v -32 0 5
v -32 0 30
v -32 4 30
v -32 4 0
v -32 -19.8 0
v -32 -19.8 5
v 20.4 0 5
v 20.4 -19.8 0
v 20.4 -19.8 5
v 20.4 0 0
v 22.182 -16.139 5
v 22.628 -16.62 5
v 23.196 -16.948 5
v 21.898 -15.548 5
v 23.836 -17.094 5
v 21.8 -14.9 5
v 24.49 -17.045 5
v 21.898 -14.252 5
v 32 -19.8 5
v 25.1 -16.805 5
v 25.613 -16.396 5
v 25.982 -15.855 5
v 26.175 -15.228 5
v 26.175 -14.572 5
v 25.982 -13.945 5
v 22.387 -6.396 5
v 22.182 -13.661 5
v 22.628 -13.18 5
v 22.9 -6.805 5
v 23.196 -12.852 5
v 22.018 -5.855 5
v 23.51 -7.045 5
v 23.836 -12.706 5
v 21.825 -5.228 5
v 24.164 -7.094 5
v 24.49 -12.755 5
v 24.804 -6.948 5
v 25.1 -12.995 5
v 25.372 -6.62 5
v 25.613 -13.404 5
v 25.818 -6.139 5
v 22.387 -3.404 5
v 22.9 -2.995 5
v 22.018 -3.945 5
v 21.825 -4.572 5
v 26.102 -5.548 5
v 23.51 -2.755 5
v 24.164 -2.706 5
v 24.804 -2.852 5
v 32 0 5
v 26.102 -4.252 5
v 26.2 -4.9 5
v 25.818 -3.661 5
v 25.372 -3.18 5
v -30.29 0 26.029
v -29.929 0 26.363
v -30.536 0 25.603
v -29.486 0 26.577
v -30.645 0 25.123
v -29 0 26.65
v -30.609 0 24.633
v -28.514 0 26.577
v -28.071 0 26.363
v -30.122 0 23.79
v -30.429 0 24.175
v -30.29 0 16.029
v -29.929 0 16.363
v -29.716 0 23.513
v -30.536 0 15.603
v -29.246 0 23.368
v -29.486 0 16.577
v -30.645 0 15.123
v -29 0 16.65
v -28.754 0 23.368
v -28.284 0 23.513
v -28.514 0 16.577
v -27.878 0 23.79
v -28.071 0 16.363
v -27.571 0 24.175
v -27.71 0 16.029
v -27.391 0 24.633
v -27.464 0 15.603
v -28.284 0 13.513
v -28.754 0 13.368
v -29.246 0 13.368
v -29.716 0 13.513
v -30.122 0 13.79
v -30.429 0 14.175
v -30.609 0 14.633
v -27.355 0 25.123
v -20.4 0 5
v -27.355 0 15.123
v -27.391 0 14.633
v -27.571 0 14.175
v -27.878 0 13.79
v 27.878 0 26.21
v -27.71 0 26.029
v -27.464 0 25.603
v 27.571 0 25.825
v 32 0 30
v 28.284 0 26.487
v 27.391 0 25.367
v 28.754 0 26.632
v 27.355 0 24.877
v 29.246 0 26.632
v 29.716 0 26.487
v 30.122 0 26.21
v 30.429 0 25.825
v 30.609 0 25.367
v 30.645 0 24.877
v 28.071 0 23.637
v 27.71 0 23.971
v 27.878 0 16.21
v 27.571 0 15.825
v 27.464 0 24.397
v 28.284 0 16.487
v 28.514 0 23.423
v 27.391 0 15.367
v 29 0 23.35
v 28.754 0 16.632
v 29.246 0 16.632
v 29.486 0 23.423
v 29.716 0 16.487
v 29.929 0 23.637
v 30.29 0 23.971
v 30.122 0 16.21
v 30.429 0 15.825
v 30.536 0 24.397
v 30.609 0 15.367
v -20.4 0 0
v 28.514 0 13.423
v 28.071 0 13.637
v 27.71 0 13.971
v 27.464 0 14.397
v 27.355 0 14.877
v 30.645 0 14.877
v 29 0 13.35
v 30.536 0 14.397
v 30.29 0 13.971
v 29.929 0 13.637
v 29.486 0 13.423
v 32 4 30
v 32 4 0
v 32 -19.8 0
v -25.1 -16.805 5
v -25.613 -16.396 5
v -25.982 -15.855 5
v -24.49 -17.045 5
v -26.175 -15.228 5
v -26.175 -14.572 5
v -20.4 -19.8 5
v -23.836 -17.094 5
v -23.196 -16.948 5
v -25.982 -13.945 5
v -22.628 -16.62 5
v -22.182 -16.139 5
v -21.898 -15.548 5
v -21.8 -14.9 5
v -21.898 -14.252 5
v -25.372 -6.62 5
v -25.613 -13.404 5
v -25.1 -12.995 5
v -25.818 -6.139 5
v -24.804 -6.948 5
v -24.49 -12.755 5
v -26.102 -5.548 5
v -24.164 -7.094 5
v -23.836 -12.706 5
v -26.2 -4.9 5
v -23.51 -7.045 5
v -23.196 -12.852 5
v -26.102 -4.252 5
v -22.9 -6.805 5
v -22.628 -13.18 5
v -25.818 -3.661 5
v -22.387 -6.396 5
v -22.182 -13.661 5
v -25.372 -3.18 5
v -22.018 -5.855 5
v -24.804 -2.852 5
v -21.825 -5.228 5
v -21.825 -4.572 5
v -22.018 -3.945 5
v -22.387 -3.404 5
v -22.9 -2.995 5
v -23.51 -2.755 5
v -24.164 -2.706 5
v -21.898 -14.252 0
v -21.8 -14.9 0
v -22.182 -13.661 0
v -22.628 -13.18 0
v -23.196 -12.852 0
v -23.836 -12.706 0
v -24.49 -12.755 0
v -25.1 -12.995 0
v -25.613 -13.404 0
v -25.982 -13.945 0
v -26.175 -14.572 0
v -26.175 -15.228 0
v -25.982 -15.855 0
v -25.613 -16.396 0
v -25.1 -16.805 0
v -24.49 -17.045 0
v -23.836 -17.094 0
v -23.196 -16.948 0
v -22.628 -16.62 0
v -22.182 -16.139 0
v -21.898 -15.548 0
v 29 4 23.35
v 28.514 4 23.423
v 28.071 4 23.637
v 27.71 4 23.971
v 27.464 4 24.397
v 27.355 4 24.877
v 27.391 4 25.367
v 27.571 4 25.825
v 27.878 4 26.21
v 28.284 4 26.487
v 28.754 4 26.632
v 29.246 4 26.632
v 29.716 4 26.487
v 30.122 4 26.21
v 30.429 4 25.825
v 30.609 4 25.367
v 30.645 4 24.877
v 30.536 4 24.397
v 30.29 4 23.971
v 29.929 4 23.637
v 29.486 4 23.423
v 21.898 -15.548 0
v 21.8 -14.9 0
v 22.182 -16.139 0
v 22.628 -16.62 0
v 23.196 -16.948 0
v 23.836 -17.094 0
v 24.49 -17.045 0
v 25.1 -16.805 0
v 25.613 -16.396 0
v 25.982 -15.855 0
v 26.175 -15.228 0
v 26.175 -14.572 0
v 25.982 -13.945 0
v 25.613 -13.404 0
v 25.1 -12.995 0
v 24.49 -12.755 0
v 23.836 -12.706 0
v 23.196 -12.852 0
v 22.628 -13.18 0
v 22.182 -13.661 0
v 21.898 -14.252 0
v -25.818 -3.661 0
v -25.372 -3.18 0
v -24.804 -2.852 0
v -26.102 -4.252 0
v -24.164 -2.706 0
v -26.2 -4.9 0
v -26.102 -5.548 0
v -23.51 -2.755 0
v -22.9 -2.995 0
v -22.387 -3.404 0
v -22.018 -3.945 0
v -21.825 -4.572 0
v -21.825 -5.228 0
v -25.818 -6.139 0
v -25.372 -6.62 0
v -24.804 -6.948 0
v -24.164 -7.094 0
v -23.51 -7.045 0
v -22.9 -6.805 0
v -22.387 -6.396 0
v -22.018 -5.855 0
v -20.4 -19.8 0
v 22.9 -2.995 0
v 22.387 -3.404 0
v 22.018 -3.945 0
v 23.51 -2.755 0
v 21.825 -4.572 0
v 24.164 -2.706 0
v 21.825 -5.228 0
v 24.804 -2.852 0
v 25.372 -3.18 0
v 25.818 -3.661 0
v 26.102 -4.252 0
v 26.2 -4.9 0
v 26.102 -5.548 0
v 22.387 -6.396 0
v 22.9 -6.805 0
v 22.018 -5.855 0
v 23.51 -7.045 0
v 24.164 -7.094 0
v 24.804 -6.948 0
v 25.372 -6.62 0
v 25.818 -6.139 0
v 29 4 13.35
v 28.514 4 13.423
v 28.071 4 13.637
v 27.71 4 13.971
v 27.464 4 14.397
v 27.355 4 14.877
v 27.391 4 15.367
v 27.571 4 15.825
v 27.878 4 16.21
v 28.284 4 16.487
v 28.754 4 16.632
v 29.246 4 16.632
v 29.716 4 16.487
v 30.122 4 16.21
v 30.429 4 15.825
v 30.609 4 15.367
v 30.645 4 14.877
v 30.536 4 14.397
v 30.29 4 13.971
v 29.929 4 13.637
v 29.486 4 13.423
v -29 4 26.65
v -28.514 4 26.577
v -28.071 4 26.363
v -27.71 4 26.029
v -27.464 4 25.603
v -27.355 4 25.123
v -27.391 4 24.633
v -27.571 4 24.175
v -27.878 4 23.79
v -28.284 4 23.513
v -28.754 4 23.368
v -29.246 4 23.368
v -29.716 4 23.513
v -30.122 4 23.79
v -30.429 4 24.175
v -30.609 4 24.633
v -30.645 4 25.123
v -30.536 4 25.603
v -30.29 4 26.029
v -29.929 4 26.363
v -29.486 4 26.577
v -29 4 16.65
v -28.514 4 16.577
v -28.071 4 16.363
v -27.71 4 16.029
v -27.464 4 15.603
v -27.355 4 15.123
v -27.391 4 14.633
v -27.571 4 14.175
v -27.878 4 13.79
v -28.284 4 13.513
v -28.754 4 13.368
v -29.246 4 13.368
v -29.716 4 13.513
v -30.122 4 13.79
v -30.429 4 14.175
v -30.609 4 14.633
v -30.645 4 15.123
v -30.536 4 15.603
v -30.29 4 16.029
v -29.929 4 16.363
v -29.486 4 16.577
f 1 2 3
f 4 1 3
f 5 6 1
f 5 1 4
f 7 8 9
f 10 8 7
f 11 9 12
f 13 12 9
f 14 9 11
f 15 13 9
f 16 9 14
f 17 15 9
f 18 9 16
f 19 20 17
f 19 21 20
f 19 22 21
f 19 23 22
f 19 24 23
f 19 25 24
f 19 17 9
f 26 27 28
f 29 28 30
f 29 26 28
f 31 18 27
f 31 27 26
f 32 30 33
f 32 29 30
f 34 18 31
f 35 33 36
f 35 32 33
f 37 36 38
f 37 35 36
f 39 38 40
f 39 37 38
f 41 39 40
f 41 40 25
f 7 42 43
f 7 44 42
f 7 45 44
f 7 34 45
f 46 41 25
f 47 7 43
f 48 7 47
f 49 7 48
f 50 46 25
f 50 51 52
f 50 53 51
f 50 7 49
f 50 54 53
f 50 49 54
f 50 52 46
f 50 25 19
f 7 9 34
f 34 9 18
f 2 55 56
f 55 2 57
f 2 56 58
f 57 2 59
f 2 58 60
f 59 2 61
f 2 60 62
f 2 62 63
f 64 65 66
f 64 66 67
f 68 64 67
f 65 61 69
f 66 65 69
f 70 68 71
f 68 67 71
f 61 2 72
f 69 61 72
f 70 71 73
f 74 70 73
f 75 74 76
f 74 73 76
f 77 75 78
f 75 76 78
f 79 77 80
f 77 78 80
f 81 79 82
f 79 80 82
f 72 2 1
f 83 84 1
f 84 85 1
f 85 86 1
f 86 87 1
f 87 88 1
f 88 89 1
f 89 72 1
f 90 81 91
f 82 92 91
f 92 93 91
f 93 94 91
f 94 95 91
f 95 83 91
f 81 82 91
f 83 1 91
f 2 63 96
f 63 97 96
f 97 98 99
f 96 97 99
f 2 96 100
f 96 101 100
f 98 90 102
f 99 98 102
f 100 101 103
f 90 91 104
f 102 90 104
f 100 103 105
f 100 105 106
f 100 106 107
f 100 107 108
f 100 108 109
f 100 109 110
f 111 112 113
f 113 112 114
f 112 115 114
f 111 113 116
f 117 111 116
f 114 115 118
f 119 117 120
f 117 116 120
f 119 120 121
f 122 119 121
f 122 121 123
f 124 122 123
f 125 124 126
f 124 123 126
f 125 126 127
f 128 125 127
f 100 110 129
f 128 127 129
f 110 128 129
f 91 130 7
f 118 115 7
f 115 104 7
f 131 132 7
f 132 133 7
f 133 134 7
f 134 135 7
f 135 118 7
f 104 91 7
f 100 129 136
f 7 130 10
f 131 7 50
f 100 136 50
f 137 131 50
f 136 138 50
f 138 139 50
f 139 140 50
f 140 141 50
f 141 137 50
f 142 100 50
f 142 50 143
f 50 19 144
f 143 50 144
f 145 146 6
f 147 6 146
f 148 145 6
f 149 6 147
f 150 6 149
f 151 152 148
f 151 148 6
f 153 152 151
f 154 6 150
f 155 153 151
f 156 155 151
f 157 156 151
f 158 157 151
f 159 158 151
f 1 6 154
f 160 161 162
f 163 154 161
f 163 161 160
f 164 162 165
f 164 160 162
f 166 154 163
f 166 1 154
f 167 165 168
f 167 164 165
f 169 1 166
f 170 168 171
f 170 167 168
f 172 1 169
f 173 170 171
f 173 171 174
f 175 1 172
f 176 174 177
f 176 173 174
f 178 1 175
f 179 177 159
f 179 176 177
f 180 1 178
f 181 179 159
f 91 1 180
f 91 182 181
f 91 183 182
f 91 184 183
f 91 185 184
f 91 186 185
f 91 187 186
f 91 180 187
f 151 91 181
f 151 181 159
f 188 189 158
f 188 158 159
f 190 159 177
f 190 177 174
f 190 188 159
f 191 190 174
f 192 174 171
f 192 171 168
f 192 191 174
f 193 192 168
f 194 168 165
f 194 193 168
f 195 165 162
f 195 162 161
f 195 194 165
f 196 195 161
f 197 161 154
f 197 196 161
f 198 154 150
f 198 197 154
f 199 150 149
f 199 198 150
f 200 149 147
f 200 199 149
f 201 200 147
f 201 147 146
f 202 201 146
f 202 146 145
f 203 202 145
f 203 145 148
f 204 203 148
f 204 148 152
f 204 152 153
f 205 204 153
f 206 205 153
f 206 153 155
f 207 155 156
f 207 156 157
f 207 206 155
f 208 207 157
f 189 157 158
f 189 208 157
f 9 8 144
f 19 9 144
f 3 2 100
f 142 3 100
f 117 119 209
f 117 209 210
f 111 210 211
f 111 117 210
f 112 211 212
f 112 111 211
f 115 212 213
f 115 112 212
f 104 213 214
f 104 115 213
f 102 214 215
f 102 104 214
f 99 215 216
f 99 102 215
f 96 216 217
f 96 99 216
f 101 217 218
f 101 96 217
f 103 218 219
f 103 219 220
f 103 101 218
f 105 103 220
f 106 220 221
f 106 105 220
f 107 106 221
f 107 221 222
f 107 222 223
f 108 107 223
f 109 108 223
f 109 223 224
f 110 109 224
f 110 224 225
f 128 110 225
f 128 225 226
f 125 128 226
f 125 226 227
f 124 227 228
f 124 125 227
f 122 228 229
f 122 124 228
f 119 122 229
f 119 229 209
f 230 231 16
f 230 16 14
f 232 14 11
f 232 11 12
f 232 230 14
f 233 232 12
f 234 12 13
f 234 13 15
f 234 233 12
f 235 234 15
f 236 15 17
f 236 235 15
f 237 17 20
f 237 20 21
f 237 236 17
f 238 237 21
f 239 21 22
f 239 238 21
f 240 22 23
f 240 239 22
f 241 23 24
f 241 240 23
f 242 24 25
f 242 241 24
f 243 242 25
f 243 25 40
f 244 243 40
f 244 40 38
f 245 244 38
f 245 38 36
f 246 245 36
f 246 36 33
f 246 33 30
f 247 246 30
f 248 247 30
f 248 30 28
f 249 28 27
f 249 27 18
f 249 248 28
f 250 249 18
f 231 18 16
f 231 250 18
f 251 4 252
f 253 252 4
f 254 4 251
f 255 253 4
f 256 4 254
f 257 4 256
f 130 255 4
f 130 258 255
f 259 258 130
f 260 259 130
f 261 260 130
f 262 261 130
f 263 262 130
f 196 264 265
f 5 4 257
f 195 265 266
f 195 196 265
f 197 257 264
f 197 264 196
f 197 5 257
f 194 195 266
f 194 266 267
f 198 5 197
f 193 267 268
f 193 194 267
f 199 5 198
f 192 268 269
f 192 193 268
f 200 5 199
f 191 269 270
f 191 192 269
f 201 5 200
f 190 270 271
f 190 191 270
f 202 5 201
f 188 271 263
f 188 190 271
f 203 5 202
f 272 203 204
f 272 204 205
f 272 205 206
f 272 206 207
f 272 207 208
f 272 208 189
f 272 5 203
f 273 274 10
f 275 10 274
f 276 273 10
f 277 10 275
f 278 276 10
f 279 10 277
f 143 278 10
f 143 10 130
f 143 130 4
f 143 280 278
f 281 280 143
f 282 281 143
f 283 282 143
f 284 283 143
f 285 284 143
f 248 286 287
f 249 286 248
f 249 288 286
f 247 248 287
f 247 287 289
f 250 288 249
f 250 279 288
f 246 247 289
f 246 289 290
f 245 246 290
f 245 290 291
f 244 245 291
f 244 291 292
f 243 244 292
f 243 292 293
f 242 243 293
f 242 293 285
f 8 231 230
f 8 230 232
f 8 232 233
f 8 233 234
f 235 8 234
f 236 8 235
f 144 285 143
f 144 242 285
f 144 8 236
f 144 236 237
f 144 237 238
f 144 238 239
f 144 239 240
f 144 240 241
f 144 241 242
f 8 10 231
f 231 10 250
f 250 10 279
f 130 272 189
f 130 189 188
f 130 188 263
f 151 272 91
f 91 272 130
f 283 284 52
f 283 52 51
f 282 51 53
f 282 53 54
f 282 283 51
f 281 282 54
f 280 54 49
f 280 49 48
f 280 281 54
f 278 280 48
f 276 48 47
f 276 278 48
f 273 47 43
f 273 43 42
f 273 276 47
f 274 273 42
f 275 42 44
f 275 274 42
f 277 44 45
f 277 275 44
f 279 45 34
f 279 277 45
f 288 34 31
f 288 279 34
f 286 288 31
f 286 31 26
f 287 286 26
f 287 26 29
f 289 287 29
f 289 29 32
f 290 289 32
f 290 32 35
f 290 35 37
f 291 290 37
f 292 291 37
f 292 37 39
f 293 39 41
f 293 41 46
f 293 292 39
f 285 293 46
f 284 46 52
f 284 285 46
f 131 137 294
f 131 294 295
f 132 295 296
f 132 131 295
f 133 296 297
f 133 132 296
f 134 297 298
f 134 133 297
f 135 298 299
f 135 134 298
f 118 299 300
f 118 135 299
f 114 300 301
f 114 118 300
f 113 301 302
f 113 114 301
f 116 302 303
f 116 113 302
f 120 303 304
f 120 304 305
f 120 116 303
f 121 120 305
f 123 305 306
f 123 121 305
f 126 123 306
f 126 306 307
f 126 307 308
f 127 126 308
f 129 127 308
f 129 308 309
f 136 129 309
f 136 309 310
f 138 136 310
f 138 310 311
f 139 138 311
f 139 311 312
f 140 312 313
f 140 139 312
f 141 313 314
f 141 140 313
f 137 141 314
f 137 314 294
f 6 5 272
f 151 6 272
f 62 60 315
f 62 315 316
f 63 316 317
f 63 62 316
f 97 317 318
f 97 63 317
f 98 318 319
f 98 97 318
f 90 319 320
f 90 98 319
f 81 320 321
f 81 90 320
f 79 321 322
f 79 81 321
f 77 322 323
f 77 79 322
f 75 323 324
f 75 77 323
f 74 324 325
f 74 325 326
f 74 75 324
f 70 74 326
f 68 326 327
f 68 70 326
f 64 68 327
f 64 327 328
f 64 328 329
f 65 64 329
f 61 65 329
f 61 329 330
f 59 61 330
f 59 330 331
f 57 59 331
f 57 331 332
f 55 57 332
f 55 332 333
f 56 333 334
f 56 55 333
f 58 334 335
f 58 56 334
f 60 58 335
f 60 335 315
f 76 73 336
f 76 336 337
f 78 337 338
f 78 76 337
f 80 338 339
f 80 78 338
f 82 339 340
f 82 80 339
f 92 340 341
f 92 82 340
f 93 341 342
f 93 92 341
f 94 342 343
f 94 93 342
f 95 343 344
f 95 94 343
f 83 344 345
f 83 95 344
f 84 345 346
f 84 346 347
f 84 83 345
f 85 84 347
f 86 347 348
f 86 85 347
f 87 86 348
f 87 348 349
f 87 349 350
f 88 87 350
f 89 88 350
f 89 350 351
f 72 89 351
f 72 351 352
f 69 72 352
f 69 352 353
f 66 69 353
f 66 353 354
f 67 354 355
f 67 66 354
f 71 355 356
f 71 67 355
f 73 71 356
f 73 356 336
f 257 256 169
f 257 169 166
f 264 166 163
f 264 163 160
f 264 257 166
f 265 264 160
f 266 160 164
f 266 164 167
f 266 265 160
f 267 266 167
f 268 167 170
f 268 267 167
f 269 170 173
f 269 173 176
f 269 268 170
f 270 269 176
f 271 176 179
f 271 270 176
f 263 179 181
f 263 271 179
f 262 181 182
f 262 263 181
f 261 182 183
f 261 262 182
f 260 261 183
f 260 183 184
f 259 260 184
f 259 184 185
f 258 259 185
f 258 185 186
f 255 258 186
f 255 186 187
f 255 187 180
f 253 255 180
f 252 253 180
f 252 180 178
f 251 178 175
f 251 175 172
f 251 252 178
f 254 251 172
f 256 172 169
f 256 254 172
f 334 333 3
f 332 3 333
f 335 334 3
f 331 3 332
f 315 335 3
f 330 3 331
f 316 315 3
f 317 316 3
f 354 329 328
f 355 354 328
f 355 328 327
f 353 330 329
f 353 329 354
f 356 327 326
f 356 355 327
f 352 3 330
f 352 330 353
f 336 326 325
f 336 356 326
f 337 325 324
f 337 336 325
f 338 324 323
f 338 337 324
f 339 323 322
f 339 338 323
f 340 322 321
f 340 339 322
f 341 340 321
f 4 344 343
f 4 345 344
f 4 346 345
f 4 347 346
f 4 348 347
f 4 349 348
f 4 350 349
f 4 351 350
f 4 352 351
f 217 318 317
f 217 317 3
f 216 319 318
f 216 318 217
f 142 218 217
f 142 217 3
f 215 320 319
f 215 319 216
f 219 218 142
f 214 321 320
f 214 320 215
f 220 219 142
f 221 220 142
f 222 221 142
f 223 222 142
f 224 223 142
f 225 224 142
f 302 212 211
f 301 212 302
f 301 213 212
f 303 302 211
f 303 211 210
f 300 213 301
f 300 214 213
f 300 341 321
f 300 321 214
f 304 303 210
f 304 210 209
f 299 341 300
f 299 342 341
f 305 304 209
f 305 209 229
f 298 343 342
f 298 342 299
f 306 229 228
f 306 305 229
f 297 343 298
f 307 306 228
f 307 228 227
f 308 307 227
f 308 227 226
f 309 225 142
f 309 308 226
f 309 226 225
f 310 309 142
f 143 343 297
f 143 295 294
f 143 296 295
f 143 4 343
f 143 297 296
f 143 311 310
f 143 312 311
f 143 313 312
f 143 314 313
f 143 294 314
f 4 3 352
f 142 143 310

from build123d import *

# Parameters (mm, degrees)
SKETCH_1_W        = 11.6
SKETCH_1_H        = 19.8
SKETCH_1_R        = 2.2
EXTRUDE_1_DEPTH   = 5
EXTRUDE_1_2_DEPTH = 5
SKETCH_3_W        = 64
SKETCH_3_H        = 30
SKETCH_3_R        = 1.65
EXTRUDE_2_DEPTH   = 4


with BuildPart() as part:
    # 草图1 → 凸台-拉伸1 (new body)
    with BuildSketch(Plane.XY):
        with Locations((26.2, -9.9)):
            Rectangle(SKETCH_1_W, SKETCH_1_H)
        with Locations((24, -4.9)):
            Circle(SKETCH_1_R, mode=Mode.SUBTRACT)
        with Locations(Location((24, -14.9, 0), (0, 0, 180))):
            Circle(SKETCH_1_R, mode=Mode.SUBTRACT)
    extrude(amount=EXTRUDE_1_DEPTH)



with BuildPart() as body_2:
    # 草图1 → Extrude 1 2 (new body)
    with BuildSketch(Plane.XY):
        with Locations((-26.2, -9.9)):
            Rectangle(SKETCH_1_W, SKETCH_1_H)
        with Locations((-24, -14.9)):
            Circle(SKETCH_1_R, mode=Mode.SUBTRACT)
        with Locations(Location((-24, -4.9, 0), (0, 0, 180))):
            Circle(SKETCH_1_R, mode=Mode.SUBTRACT)
    extrude(amount=EXTRUDE_1_2_DEPTH)


with BuildPart() as part_1:
    add(part.part)

    add(body_2.part)  # 凸台-拉伸2 merges body 2
    # 草图3 → 凸台-拉伸2 (add)
    with BuildSketch(Plane(origin=(0, 0, 0), x_dir=(1, 0, 0), z_dir=(0, 1, 0))):
        with Locations((0, -15)):
            Rectangle(SKETCH_3_W, SKETCH_3_H)
        with Locations(Location((-29, -15, 0), (0, 0, 270))):
            Circle(SKETCH_3_R, mode=Mode.SUBTRACT)
        with Locations(Location((-29, -25, 0), (0, 0, 270))):
            Circle(SKETCH_3_R, mode=Mode.SUBTRACT)
        with Locations(Location((29, -25, 0), (0, 0, 90))):
            Circle(SKETCH_3_R, mode=Mode.SUBTRACT)
        with Locations(Location((29, -15, 0), (0, 0, 90))):
            Circle(SKETCH_3_R, mode=Mode.SUBTRACT)
    extrude(amount=EXTRUDE_2_DEPTH)


solid = part_1.part
